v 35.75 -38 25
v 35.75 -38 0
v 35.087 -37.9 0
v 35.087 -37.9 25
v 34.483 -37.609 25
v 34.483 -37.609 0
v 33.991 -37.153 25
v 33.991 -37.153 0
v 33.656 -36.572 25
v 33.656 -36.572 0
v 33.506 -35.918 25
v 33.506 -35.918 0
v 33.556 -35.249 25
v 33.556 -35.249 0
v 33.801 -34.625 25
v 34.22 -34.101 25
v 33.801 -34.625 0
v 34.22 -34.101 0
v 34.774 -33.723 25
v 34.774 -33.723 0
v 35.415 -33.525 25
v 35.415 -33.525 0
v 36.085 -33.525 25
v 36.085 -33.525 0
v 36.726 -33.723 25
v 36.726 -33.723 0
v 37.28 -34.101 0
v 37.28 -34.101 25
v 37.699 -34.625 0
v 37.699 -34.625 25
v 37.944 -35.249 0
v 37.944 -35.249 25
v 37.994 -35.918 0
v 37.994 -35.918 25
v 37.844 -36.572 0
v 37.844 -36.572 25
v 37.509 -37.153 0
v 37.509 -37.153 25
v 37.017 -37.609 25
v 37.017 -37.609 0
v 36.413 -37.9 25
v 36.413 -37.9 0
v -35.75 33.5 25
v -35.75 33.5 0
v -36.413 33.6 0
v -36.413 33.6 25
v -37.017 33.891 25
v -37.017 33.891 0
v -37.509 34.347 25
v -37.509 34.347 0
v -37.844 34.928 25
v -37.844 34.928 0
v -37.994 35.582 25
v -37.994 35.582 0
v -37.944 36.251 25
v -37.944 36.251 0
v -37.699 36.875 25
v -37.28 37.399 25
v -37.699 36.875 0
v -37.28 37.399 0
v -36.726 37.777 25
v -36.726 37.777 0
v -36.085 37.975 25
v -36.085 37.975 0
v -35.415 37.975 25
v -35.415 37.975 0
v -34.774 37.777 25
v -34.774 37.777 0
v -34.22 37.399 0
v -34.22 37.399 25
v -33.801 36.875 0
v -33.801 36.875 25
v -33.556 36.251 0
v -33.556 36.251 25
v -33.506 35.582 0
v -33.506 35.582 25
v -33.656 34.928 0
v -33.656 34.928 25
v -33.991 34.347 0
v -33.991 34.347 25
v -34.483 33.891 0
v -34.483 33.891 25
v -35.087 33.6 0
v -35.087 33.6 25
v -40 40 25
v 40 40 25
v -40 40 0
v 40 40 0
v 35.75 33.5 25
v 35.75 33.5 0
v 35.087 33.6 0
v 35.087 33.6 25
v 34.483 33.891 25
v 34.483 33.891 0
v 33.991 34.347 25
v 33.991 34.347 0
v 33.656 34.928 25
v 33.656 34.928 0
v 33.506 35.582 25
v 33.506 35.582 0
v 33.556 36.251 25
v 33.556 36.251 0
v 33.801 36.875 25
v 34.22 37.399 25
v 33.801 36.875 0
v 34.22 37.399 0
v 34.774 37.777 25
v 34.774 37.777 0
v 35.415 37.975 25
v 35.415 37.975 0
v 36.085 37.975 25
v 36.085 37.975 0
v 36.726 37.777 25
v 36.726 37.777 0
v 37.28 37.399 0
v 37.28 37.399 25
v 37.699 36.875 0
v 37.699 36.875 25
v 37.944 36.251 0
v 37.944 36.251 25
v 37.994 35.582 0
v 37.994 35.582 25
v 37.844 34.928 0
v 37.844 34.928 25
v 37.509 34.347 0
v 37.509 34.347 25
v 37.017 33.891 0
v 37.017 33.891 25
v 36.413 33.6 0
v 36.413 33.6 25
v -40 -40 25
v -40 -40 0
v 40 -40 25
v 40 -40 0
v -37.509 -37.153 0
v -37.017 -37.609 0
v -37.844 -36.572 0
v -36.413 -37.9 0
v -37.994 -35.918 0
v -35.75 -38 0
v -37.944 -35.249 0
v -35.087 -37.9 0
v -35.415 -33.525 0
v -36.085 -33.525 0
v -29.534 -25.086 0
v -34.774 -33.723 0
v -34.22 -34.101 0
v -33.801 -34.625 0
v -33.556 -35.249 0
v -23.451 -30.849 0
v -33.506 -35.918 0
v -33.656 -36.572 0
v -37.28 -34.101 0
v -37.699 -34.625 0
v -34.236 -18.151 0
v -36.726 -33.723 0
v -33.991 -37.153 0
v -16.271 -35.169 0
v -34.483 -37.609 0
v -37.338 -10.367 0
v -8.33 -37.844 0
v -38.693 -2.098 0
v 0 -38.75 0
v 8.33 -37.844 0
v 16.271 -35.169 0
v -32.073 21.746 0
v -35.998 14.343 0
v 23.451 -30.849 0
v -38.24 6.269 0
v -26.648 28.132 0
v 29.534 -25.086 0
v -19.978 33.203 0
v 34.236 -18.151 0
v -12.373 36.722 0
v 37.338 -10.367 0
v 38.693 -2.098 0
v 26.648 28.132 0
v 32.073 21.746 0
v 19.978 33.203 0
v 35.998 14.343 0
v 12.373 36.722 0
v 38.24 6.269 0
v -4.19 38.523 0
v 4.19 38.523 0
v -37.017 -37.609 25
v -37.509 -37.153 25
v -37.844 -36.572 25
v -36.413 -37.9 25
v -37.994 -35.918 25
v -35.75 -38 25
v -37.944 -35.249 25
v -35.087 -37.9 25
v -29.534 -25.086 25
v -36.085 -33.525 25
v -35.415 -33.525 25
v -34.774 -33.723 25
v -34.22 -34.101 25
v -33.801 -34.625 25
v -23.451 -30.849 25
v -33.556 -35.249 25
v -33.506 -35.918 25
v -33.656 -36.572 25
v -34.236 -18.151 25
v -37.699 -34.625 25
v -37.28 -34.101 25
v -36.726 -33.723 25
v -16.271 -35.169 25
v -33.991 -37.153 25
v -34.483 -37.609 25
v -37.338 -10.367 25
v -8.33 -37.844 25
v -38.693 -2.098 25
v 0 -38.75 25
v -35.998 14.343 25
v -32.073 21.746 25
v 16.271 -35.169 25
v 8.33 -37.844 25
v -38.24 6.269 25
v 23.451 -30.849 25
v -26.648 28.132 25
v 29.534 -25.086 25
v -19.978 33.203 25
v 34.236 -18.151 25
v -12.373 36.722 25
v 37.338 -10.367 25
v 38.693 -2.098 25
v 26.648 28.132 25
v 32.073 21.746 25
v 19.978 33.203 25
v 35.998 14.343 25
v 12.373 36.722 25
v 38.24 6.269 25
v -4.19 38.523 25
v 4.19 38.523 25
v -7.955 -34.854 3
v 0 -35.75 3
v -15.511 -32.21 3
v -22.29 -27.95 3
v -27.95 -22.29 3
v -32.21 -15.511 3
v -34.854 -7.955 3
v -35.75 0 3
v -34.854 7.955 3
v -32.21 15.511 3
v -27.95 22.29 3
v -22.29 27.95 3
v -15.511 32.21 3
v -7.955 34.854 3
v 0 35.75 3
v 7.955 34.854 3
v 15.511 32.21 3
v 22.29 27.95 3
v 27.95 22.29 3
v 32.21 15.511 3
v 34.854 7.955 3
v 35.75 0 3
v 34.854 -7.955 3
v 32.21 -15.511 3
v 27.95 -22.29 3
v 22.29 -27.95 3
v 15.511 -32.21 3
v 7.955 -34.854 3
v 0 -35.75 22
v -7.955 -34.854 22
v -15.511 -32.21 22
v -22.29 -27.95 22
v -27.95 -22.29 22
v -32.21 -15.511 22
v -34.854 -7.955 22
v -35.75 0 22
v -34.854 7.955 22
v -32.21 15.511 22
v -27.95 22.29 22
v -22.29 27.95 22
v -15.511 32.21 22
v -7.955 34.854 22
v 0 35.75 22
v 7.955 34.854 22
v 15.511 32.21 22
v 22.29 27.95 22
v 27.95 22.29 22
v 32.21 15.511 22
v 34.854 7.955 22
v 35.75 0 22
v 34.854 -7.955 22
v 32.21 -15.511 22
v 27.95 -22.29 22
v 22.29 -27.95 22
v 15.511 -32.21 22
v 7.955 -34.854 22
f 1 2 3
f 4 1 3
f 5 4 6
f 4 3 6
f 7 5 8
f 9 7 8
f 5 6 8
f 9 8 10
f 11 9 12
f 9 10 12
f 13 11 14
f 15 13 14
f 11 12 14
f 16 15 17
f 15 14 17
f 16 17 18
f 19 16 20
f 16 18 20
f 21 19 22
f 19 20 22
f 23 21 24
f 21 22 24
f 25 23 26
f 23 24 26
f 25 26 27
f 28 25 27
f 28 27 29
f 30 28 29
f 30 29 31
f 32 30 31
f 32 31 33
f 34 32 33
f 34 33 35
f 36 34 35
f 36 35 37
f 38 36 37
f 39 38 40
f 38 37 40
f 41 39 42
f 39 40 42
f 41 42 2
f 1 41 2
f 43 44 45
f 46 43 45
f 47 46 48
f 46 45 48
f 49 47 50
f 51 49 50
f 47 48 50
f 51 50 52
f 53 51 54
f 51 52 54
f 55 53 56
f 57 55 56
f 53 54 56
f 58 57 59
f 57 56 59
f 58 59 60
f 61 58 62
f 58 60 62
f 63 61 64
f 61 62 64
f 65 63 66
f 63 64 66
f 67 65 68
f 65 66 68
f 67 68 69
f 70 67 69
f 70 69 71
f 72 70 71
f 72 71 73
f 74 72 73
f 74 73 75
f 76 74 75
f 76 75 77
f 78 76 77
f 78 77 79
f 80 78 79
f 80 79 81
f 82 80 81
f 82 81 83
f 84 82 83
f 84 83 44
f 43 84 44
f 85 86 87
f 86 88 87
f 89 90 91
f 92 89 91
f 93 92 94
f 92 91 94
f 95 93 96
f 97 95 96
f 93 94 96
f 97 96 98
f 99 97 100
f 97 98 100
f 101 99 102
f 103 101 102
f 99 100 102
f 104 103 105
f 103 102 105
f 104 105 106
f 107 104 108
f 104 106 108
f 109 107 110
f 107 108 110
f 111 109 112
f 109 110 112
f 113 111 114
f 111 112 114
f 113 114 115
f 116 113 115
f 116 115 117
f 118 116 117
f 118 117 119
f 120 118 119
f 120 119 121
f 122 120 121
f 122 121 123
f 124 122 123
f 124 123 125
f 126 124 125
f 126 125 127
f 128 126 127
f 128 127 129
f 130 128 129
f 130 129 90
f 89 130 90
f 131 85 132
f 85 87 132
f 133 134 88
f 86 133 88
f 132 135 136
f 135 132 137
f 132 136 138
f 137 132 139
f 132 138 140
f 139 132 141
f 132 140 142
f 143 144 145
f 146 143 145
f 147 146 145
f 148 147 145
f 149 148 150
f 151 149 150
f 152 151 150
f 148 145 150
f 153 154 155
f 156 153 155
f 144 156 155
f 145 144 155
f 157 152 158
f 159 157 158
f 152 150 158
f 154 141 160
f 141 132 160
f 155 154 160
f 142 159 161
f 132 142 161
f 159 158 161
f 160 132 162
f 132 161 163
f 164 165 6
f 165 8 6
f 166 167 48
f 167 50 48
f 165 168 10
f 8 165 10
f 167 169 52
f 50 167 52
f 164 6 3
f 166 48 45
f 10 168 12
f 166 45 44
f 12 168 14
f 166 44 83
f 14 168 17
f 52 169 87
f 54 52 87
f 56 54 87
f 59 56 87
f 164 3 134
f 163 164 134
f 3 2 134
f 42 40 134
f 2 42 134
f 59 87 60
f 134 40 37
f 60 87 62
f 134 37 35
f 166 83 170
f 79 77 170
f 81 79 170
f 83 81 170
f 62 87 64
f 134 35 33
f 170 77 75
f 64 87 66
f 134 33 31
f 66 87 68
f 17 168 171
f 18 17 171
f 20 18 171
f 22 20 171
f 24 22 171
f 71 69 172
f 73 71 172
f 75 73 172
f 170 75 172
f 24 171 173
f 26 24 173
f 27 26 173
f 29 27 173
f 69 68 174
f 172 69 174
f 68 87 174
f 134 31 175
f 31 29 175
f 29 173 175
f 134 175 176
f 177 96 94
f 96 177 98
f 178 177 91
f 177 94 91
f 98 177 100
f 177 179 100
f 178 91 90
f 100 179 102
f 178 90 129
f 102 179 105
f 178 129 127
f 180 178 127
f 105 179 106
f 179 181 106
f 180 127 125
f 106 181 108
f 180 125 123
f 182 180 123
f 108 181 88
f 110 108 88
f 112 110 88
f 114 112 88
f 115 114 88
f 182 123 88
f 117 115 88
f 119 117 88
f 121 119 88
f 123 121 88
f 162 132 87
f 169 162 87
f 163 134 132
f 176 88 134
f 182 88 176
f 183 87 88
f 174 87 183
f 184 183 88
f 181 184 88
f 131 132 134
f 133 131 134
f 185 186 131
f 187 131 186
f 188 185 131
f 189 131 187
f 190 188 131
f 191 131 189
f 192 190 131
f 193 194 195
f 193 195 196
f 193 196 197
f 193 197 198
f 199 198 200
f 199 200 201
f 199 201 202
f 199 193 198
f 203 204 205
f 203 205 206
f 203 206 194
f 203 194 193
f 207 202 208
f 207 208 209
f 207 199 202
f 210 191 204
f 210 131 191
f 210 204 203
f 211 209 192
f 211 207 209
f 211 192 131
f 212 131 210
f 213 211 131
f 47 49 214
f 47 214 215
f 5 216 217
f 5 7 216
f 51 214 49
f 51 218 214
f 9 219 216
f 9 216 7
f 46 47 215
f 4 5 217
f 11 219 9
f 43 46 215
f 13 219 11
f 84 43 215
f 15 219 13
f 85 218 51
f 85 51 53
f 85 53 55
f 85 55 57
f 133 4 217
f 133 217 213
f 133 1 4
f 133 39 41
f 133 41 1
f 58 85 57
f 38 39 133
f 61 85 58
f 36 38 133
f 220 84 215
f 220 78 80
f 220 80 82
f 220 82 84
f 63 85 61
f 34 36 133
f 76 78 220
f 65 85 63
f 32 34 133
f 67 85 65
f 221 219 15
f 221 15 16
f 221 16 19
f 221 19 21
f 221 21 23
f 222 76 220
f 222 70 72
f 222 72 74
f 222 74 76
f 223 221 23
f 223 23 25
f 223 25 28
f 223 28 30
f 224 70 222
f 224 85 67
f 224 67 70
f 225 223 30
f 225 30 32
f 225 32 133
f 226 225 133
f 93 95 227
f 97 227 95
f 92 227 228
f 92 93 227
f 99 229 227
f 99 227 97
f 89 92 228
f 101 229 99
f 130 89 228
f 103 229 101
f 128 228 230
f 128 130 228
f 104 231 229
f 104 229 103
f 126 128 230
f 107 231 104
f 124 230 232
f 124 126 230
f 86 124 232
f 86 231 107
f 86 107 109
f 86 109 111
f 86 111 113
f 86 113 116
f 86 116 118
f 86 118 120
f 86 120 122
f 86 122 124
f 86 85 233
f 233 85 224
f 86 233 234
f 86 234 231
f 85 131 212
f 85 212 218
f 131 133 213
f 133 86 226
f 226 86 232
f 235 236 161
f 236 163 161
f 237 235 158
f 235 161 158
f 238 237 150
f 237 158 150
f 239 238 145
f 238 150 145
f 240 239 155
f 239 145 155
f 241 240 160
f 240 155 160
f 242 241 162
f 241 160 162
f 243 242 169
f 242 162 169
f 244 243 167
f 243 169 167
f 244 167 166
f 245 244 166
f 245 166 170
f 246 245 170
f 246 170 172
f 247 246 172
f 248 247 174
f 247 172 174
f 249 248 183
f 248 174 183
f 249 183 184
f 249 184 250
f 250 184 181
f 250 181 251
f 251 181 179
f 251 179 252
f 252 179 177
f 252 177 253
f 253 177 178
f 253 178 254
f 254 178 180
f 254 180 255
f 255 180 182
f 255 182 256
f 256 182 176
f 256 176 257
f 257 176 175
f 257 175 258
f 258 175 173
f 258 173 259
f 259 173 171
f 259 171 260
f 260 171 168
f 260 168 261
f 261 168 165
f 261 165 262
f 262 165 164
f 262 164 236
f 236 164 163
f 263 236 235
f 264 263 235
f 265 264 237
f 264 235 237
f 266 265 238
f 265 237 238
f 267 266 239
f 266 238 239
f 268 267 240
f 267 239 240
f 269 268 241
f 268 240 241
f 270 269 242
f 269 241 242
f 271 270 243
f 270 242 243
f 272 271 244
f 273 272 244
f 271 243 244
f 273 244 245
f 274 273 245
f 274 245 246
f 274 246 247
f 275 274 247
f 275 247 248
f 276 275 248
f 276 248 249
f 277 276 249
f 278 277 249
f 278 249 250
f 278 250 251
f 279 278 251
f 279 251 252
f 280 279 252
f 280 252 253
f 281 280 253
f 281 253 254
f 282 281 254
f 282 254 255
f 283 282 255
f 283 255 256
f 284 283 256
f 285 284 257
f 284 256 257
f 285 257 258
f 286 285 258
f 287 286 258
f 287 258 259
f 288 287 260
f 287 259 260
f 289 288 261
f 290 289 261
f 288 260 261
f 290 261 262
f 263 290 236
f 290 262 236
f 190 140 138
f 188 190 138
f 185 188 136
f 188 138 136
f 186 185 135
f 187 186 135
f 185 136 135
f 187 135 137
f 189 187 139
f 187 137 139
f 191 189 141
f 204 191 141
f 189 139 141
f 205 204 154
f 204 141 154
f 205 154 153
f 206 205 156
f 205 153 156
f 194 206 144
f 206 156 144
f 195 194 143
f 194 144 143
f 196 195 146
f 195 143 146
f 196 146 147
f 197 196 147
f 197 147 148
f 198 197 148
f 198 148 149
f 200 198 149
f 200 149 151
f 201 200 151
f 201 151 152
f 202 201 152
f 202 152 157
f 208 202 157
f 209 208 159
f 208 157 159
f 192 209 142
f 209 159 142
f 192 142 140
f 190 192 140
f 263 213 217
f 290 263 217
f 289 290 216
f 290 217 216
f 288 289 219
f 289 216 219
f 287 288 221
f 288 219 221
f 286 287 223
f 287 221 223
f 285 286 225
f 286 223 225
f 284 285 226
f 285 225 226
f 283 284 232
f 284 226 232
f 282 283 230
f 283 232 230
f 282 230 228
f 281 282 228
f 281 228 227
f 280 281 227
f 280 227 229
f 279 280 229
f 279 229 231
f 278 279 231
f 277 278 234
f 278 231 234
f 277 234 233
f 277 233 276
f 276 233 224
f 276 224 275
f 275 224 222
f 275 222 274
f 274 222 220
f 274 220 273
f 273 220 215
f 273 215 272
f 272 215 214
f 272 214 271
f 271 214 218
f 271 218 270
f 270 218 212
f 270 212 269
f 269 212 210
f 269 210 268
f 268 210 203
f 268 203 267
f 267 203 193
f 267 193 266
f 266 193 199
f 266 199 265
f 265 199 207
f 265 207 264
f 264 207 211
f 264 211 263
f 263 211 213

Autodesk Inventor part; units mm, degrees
ref_plane "YZ Plane" through (0, 0, 0) normal (1, 0, 0) x (0, 1, 0)
ref_plane "XZ Plane" through (0, 0, 0) normal (0, 1, 0) x (-1, 0, 0)
ref_plane "XY Plane" through (0, 0, 0) normal (0, 0, 1) x (1, 0, 0)
sketch "Sketch1" plane through (0, 0, 0) normal (0, 0, 1) x (1, 0, 0)
  line L0 (-40, -40) -> (40, -40)
  line L1 (40, -40) -> (40, 40)
  line L2 (40, 40) -> (-40, 40)
  line L3 (-40, 40) -> (-40, -40)
  point P0 (0, 0)
  point P1 (40, 0)
  point P2 (0, 40)
  dimension "L" = 80
  dimension "d1" = 80
extrude "Extrusion1" add sketch "Sketch1" along normal blind 25
sketch "Sketch2" plane through (0, 0, 25) normal (0, 0, 1) x (1, 0, 0)
  line L0 (-35.75, -35.75) -> (35.75, -35.75) construction
  line L1 (35.75, -35.75) -> (35.75, 35.75) construction
  line L2 (35.75, 35.75) -> (-35.75, 35.75) construction
  line L3 (-35.75, 35.75) -> (-35.75, -35.75) construction
  point P0 (0, 0)
  point P1 (-35.75, 0)
  point P2 (0, 35.75)
  dimension "inner" = 71.5
  dimension "d5" = 71.5
hole "Hole1" at (-35.75, 35.75, 25) at (35.75, 35.75, 25) at (-35.75, -35.75, 25) at (35.75, -35.75, 25) direction (0, 0, -1) diameter 4.5 end through all
sketch "Sketch3" plane through (0, 0, 25) normal (0, 0, 1) x (1, 0, 0)
  point P0 (0, 0)
  point P1 (0, 0)
hole "Hole2" at (0, 0, 25) direction (0, 0, -1) diameter 71.5 end through all
chamfer "Chamfer1" distance 3 angle 45 2 edges at (0, 35.75, 25) (0, 35.75, 0)
equation "\"d1\" = L"
equation "\"d5\" = inner"
properties part number "fan" material "ABS Plastic"
